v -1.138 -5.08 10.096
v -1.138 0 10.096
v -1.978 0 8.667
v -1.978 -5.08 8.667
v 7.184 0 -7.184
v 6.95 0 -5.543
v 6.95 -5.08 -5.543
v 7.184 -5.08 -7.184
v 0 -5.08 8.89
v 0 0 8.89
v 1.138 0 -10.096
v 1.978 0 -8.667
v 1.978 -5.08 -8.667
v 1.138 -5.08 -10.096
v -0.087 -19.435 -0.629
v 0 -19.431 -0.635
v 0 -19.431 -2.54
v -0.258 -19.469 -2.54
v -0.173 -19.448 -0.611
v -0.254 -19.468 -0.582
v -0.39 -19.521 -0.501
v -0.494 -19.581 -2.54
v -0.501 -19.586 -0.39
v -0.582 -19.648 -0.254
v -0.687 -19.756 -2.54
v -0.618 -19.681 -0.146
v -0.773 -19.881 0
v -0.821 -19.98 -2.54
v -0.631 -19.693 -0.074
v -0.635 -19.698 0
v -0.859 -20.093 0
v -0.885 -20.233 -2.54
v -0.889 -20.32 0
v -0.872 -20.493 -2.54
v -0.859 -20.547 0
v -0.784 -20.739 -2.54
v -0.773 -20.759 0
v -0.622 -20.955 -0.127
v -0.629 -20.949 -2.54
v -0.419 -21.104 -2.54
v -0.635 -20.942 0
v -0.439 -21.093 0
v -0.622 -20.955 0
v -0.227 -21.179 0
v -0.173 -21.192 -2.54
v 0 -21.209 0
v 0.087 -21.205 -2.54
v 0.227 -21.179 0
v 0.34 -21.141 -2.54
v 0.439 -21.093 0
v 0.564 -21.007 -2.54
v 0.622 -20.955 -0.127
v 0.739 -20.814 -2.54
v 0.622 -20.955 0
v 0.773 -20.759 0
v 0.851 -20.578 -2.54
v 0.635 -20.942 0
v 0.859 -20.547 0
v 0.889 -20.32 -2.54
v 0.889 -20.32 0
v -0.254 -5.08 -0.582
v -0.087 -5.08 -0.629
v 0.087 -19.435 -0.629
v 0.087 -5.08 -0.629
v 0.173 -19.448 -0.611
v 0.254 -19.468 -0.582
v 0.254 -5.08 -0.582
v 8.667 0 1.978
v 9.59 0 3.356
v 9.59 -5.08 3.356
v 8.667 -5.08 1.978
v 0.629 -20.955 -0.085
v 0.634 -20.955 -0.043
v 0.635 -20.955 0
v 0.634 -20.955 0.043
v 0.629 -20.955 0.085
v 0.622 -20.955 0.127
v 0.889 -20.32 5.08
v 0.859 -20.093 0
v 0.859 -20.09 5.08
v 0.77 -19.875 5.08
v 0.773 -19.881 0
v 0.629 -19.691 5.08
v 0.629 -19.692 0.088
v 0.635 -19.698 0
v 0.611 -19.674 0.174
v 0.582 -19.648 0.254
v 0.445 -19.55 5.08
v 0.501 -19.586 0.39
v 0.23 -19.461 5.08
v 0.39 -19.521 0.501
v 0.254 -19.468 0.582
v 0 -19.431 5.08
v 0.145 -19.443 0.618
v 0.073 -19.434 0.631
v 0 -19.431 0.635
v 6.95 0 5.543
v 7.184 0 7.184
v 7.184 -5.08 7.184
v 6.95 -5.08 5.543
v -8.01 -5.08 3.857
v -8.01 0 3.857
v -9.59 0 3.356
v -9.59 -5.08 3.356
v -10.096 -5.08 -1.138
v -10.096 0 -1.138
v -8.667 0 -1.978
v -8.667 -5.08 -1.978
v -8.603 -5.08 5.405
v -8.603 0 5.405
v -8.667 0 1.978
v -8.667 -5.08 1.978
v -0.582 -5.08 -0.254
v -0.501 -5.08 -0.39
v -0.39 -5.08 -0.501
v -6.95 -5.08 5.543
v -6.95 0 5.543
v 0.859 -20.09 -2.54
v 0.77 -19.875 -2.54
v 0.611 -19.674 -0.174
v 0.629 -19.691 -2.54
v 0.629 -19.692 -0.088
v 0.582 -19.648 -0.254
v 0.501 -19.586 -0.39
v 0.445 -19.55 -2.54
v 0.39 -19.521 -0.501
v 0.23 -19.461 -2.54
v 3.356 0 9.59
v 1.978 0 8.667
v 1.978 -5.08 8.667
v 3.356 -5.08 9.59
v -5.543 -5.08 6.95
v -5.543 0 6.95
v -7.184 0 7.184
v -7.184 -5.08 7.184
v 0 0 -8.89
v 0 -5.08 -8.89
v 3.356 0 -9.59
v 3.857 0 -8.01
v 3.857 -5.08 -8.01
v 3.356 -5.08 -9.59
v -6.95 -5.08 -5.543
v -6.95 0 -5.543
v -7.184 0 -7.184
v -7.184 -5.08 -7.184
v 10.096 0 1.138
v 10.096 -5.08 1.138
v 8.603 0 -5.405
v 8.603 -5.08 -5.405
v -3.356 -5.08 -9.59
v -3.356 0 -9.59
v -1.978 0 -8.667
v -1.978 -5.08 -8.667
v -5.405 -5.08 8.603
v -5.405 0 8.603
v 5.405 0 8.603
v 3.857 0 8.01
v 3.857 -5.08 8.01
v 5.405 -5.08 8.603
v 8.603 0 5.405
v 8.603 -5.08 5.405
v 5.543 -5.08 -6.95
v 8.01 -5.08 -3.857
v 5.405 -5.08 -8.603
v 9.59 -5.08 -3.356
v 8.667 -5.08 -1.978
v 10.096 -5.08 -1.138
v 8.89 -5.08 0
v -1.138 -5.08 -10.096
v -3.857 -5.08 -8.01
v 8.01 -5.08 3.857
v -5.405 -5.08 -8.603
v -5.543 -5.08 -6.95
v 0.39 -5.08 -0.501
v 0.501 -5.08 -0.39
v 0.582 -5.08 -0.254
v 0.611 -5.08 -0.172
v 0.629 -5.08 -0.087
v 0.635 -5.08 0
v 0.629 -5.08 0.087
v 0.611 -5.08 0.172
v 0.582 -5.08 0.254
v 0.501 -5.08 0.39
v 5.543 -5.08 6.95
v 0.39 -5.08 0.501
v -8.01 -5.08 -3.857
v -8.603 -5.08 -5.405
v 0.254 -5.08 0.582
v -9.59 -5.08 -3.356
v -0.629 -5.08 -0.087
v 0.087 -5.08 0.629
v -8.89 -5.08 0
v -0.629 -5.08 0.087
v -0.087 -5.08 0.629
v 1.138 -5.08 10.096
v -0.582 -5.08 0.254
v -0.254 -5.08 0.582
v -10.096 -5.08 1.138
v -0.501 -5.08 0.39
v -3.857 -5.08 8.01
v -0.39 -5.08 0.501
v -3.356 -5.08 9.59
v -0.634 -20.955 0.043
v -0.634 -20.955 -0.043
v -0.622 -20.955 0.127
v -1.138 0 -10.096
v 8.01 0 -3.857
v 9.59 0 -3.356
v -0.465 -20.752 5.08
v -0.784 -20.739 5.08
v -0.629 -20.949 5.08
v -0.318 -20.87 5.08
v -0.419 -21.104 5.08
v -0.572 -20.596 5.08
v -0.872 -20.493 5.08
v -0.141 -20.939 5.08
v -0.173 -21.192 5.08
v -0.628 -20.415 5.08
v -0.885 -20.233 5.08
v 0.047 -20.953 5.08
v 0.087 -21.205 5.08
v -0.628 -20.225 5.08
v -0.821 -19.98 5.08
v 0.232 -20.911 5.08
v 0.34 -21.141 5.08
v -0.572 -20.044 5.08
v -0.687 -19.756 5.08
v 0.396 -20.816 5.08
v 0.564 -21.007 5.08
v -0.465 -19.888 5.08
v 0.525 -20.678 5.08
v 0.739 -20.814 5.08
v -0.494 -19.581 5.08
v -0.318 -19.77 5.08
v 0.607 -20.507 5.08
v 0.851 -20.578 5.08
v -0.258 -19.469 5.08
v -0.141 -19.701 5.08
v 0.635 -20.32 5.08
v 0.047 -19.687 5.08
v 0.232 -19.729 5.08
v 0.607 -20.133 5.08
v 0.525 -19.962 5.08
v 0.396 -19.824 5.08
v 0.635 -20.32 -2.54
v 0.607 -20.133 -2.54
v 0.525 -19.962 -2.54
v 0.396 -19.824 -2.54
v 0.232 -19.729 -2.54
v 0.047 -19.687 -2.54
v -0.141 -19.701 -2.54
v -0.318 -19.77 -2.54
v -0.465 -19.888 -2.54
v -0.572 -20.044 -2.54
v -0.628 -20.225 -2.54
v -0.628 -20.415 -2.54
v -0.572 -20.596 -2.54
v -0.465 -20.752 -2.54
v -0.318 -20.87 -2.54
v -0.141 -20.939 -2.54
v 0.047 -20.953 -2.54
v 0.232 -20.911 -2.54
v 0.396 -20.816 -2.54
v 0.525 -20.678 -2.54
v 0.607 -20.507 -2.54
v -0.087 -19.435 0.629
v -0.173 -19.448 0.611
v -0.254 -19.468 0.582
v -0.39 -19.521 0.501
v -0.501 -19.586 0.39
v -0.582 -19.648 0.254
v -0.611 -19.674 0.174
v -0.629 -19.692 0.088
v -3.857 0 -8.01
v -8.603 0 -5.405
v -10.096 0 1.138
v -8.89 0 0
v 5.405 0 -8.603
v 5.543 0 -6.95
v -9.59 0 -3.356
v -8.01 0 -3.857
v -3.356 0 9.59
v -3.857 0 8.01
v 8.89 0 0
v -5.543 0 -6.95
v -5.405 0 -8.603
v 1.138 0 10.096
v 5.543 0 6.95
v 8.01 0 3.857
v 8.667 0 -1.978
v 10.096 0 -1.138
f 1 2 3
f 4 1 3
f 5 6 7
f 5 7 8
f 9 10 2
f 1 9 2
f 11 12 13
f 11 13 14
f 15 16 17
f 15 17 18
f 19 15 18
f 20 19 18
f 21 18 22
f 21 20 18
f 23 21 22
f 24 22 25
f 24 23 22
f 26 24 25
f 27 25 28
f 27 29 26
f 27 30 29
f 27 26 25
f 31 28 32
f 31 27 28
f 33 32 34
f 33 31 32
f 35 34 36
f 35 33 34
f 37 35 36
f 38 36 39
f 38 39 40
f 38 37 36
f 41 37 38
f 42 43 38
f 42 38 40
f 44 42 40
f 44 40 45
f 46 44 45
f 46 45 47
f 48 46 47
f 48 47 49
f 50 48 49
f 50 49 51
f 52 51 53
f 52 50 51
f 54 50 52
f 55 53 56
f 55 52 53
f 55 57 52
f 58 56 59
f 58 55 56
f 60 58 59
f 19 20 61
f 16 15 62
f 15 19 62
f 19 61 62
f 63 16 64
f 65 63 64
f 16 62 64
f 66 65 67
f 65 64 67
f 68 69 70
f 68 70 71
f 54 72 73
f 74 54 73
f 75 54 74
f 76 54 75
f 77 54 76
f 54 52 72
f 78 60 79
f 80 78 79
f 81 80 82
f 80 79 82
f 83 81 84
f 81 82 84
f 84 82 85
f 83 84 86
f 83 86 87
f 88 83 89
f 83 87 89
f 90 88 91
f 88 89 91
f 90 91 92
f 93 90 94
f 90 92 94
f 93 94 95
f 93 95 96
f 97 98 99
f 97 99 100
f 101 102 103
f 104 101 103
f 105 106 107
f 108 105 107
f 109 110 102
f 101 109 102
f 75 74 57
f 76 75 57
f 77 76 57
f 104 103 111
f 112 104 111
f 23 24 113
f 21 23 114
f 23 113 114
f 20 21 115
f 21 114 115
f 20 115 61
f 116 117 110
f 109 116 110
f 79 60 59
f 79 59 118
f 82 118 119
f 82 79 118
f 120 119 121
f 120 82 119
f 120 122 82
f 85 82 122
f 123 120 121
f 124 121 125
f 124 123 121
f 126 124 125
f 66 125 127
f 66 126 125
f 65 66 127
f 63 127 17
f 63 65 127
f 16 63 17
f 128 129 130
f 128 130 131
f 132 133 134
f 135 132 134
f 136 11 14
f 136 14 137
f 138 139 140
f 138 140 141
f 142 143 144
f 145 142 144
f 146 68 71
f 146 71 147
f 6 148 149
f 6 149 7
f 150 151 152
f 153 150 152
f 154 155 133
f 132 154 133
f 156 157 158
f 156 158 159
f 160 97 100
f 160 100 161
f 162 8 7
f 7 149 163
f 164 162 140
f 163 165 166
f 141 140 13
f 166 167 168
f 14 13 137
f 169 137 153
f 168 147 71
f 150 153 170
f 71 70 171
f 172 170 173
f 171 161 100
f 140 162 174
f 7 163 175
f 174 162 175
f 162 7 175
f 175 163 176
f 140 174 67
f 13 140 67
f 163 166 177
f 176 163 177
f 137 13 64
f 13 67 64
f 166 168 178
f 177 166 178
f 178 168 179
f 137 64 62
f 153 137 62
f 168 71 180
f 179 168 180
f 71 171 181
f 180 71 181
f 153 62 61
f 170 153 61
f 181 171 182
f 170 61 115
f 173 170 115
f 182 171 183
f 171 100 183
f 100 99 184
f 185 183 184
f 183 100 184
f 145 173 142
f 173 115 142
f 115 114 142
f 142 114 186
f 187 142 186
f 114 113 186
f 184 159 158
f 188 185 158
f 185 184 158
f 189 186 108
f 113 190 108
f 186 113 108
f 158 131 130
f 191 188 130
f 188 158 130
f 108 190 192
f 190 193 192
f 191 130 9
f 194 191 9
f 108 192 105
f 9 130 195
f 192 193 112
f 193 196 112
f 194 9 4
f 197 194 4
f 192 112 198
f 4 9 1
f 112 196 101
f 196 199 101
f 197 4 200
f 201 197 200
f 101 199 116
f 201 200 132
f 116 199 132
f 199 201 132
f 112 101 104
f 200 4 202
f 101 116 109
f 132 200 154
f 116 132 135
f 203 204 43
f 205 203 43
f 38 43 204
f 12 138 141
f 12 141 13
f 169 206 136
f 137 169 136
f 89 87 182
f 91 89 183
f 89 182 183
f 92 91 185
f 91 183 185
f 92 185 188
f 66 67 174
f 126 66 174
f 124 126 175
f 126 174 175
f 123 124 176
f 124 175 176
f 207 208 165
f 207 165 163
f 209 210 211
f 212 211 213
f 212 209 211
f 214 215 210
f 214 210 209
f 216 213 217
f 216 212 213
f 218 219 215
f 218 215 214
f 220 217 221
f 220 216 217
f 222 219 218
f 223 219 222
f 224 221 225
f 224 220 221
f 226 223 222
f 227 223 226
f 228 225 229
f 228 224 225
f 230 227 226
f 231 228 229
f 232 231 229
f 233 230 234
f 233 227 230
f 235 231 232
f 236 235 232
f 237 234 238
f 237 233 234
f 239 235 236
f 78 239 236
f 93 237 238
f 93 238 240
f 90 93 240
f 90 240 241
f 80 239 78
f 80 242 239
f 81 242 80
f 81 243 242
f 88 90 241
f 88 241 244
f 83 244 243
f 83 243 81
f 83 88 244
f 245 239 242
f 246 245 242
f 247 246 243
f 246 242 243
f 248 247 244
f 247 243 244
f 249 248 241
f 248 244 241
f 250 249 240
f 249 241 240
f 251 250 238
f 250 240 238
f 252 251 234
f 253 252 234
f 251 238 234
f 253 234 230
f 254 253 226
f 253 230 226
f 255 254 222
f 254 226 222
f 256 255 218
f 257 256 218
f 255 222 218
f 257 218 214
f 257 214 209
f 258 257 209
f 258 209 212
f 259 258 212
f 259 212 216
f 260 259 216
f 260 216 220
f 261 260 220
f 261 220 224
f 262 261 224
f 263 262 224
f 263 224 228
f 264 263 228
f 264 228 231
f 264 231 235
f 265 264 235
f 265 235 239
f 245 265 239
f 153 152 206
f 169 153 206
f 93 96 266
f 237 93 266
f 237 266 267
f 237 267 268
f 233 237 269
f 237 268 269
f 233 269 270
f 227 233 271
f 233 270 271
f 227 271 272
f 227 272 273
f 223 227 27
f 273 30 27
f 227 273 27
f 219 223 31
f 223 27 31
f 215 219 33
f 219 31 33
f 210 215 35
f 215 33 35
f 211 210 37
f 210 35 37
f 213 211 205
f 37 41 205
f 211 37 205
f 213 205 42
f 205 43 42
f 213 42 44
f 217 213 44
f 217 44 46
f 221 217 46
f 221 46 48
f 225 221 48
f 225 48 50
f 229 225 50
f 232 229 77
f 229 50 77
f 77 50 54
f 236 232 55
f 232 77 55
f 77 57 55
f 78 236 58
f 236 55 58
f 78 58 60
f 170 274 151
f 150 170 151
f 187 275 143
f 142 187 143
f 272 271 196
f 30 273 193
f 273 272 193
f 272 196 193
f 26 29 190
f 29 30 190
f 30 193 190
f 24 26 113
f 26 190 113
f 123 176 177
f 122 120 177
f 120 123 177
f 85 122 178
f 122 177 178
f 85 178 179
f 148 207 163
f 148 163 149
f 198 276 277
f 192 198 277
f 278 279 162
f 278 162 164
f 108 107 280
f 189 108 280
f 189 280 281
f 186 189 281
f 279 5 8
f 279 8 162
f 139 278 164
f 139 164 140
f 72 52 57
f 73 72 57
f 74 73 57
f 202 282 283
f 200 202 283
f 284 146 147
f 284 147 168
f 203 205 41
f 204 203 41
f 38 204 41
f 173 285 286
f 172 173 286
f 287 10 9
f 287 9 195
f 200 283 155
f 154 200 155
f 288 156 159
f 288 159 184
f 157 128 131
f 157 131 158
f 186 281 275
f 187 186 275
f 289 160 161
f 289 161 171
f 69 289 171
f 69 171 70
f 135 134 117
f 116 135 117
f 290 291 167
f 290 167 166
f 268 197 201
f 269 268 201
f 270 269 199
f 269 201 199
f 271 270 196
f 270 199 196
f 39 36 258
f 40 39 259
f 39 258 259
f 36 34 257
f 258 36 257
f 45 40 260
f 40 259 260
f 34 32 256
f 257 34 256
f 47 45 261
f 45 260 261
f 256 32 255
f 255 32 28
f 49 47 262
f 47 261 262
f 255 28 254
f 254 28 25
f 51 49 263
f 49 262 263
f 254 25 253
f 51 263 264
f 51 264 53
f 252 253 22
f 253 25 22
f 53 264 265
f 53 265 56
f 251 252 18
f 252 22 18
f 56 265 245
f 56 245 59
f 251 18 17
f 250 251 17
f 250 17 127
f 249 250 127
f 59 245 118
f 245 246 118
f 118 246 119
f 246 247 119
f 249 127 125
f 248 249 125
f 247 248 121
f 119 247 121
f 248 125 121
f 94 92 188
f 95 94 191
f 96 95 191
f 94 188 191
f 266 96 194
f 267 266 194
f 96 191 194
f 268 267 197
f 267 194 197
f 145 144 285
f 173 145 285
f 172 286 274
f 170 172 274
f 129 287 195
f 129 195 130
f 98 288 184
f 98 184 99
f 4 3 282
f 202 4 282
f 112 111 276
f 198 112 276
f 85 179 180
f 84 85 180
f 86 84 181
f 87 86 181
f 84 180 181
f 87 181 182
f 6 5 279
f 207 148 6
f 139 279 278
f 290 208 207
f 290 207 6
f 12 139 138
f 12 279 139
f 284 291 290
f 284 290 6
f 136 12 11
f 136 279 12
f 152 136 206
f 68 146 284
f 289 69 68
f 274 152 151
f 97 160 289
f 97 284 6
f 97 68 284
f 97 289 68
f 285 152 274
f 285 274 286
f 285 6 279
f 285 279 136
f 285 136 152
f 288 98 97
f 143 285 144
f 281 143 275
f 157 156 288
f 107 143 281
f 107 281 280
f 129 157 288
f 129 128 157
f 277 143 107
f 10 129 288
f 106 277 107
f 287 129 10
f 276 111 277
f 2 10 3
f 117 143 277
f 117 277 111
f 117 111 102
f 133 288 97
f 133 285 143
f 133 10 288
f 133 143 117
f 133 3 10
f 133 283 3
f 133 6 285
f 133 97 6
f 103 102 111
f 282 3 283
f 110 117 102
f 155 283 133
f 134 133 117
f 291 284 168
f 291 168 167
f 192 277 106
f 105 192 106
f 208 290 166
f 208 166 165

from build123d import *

# Parameters (mm, degrees)
F1_DEPTH      = 5.08
F3_W          = 0.508
F3_H          = 0.508
F4_DEPTH      = 15.875
F6_DEPTH      = 5.08
F6_DEPTH_BACK = 2.54
F7_R          = 0.635
F8_DEPTH      = 15.1771160525


with BuildPart() as f1:
    # F0 (on Front) → F1 (new body)
    with BuildSketch(Plane.XZ):
        with BuildLine():
            Line((-4.7297651602, 7.5273781311), (0, 0))
            Line((0, 0), (-3.8572264408, 8.0096132357))
            ThreePointArc((-3.8572264408, 8.0096132357), (-4.3002609064, 7.7807362208), (-4.7297651602, 7.5273781311))
        make_face()
        with BuildLine():
            Line((-5.5428243385, 6.9504818791), (0, 0))
            Line((0, 0), (-4.7297651602, 7.5273781311))
            ThreePointArc((-4.7297651602, 7.5273781311), (-5.144387823, 7.250336125), (-5.5428243385, 6.9504818791))
        make_face()
        with BuildLine():
            Line((-5.4054458974, 8.6027178642), (-5.5428243385, 6.9504818791))
            ThreePointArc((-5.5428243385, 6.9504818791), (-5.144387823, 7.250336125), (-4.7297651602, 7.5273781311))
            Line((-4.7297651602, 7.5273781311), (-5.4054458974, 8.6027178642))
        make_face()
        with BuildLine():
            Line((-5.4054458974, 8.6027178642), (-4.7297651602, 7.5273781311))
            ThreePointArc((-4.7297651602, 7.5273781311), (-4.3002609064, 7.7807362208), (-3.8572264408, 8.0096132357))
            Line((-3.8572264408, 8.0096132357), (-5.4054458974, 8.6027178642))
        make_face()
        with BuildLine():
            Line((-3.3556352695, 9.5898546359), (-3.8572264408, 8.0096132357))
            ThreePointArc((-3.8572264408, 8.0096132357), (-3.4020557137, 8.213289044), (-2.9361808608, 8.3911228064))
            Line((-2.9361808608, 8.3911228064), (-3.3556352695, 9.5898546359))
        make_face()
        with BuildLine():
            Line((-3.3556352695, 9.5898546359), (-2.9361808608, 8.3911228064))
            ThreePointArc((-2.9361808608, 8.3911228064), (-2.4610676966, 8.5425549921), (-1.9782111029, 8.6671091393))
            Line((-1.9782111029, 8.6671091393), (-3.3556352695, 9.5898546359))
        make_face()
        with BuildLine():
            Line((-2.9361808608, 8.3911228064), (0, 0))
            Line((0, 0), (-1.9782111029, 8.6671091393))
            ThreePointArc((-1.9782111029, 8.6671091393), (-2.4610676966, 8.5425549921), (-2.9361808608, 8.3911228064))
        make_face()
        with BuildLine():
            Line((-3.8572264408, 8.0096132357), (0, 0))
            Line((0, 0), (-2.9361808608, 8.3911228064))
            ThreePointArc((-2.9361808608, 8.3911228064), (-3.4020557137, 8.213289044), (-3.8572264408, 8.0096132357))
        make_face()
        with BuildLine():
            Line((-0.9953641926, 8.834101546), (0, 0))
            Line((0, 0), (0, 8.89))
            ThreePointArc((0, 8.89), (-0.4984662759, 8.8760143855), (-0.9953641926, 8.834101546))
        make_face()
        with BuildLine():
            ThreePointArc((-0.9953641926, 8.834101546), (-0.4984662759, 8.8760143855), (0, 8.89))
            Line((0, 8.89), (-1.1375590772, 10.0961160525))
            Line((-1.1375590772, 10.0961160525), (-0.9953641926, 8.834101546))
        make_face()
        with BuildLine():
            Line((-1.1375590772, 10.0961160525), (-1.9782111029, 8.6671091393))
            ThreePointArc((-1.9782111029, 8.6671091393), (-1.4891303252, 8.7643933546), (-0.9953641926, 8.834101546))
            Line((-0.9953641926, 8.834101546), (-1.1375590772, 10.0961160525))
        make_face()
        with BuildLine():
            Line((-1.9782111029, 8.6671091393), (0, 0))
            Line((0, 0), (-0.9953641926, 8.834101546))
            ThreePointArc((-0.9953641926, 8.834101546), (-1.4891303252, 8.7643933546), (-1.9782111029, 8.6671091393))
        make_face()
        with BuildLine():
            Line((-6.2861792847, 6.2861792847), (0, 0))
            Line((0, 0), (-5.5428243385, 6.9504818791))
            ThreePointArc((-5.5428243385, 6.9504818791), (-5.923821078, 6.6287588458), (-6.2861792847, 6.2861792847))
        make_face()
        with BuildLine():
            Line((-7.1842048969, 7.1842048969), (-6.2861792847, 6.2861792847))
            ThreePointArc((-6.2861792847, 6.2861792847), (-5.923821078, 6.6287588458), (-5.5428243385, 6.9504818791))
            Line((-5.5428243385, 6.9504818791), (-7.1842048969, 7.1842048969))
        make_face()
        with BuildLine():
            Line((-6.9504818791, 5.5428243385), (0, 0))
            Line((0, 0), (-6.2861792847, 6.2861792847))
            ThreePointArc((-6.2861792847, 6.2861792847), (-6.6287588458, 5.923821078), (-6.9504818791, 5.5428243385))
        make_face()
        with BuildLine():
            Line((-7.1842048969, 7.1842048969), (-6.9504818791, 5.5428243385))
            ThreePointArc((-6.9504818791, 5.5428243385), (-6.6287588458, 5.923821078), (-6.2861792847, 6.2861792847))
            Line((-6.2861792847, 6.2861792847), (-7.1842048969, 7.1842048969))
        make_face()
        with BuildLine():
            Line((-7.5273781311, 4.7297651602), (0, 0))
            Line((0, 0), (-6.9504818791, 5.5428243385))
            ThreePointArc((-6.9504818791, 5.5428243385), (-7.250336125, 5.144387823), (-7.5273781311, 4.7297651602))
        make_face()
        with BuildLine():
            Line((-8.6027178642, 5.4054458974), (-7.5273781311, 4.7297651602))
            ThreePointArc((-7.5273781311, 4.7297651602), (-7.250336125, 5.144387823), (-6.9504818791, 5.5428243385))
            Line((-6.9504818791, 5.5428243385), (-8.6027178642, 5.4054458974))
        make_face()
        with BuildLine():
            Line((-8.6027178642, 5.4054458974), (-8.0096132357, 3.8572264408))
            ThreePointArc((-8.0096132357, 3.8572264408), (-7.7807362208, 4.3002609064), (-7.5273781311, 4.7297651602))
            Line((-7.5273781311, 4.7297651602), (-8.6027178642, 5.4054458974))
        make_face()
        with BuildLine():
            Line((-8.0096132357, 3.8572264408), (0, 0))
            Line((0, 0), (-7.5273781311, 4.7297651602))
            ThreePointArc((-7.5273781311, 4.7297651602), (-7.7807362208, 4.3002609064), (-8.0096132357, 3.8572264408))
        make_face()
        with BuildLine():
            Line((-8.3911228064, 2.9361808608), (0, 0))
            Line((0, 0), (-8.0096132357, 3.8572264408))
            ThreePointArc((-8.0096132357, 3.8572264408), (-8.213289044, 3.4020557137), (-8.3911228064, 2.9361808608))
        make_face()
        with BuildLine():
            Line((-9.5898546359, 3.3556352695), (-8.3911228064, 2.9361808608))
            ThreePointArc((-8.3911228064, 2.9361808608), (-8.213289044, 3.4020557137), (-8.0096132357, 3.8572264408))
            Line((-8.0096132357, 3.8572264408), (-9.5898546359, 3.3556352695))
        make_face()
        with BuildLine():
            Line((-9.5898546359, 3.3556352695), (-8.6671091393, 1.9782111029))
            ThreePointArc((-8.6671091393, 1.9782111029), (-8.5425549921, 2.4610676966), (-8.3911228064, 2.9361808608))
            Line((-8.3911228064, 2.9361808608), (-9.5898546359, 3.3556352695))
        make_face()
        with BuildLine():
            Line((-8.6671091393, 1.9782111029), (0, 0))
            Line((0, 0), (-8.3911228064, 2.9361808608))
            ThreePointArc((-8.3911228064, 2.9361808608), (-8.5425549921, 2.4610676966), (-8.6671091393, 1.9782111029))
        make_face()
        with BuildLine():
            Line((-8.834101546, 0.9953641926), (0, 0))
            Line((0, 0), (-8.6671091393, 1.9782111029))
            ThreePointArc((-8.6671091393, 1.9782111029), (-8.7643933546, 1.4891303252), (-8.834101546, 0.9953641926))
        make_face()
        with BuildLine():
            Line((-10.0961160525, 1.1375590772), (-8.834101546, 0.9953641926))
            ThreePointArc((-8.834101546, 0.9953641926), (-8.7643933546, 1.4891303252), (-8.6671091393, 1.9782111029))
            Line((-8.6671091393, 1.9782111029), (-10.0961160525, 1.1375590772))
        make_face()
        with BuildLine():
            Line((-10.0961160525, 1.1375590772), (-8.89, 0))
            ThreePointArc((-8.89, 0), (-8.8760143855, 0.4984662759), (-8.834101546, 0.9953641926))
            Line((-8.834101546, 0.9953641926), (-10.0961160525, 1.1375590772))
        make_face()
        with BuildLine():
            Line((-8.89, 0), (0, 0))
            Line((0, 0), (-8.834101546, 0.9953641926))
            ThreePointArc((-8.834101546, 0.9953641926), (-8.8760143855, 0.4984662759), (-8.89, 0))
        make_face()
        with BuildLine():
            Line((-8.834101546, -0.9953641926), (0, 0))
            Line((0, 0), (-8.89, 0))
            ThreePointArc((-8.89, 0), (-8.8760143855, -0.4984662759), (-8.834101546, -0.9953641926))
        make_face()
        with BuildLine():
            Line((-10.0961160525, -1.1375590772), (-8.834101546, -0.9953641926))
            ThreePointArc((-8.834101546, -0.9953641926), (-8.8760143855, -0.4984662759), (-8.89, 0))
            Line((-8.89, 0), (-10.0961160525, -1.1375590772))
        make_face()
        with BuildLine():
            Line((-10.0961160525, -1.1375590772), (-8.6671091393, -1.9782111029))
            ThreePointArc((-8.6671091393, -1.9782111029), (-8.7643933546, -1.4891303252), (-8.834101546, -0.9953641926))
            Line((-8.834101546, -0.9953641926), (-10.0961160525, -1.1375590772))
        make_face()
        with BuildLine():
            Line((-8.6671091393, -1.9782111029), (0, 0))
            Line((0, 0), (-8.834101546, -0.9953641926))
            ThreePointArc((-8.834101546, -0.9953641926), (-8.7643933546, -1.4891303252), (-8.6671091393, -1.9782111029))
        make_face()
        with BuildLine():
            Line((-8.3911228064, -2.9361808608), (0, 0))
            Line((0, 0), (-8.6671091393, -1.9782111029))
            ThreePointArc((-8.6671091393, -1.9782111029), (-8.5425549921, -2.4610676966), (-8.3911228064, -2.9361808608))
        make_face()
        with BuildLine():
            Line((-9.5898546359, -3.3556352695), (-8.3911228064, -2.9361808608))
            ThreePointArc((-8.3911228064, -2.9361808608), (-8.5425549921, -2.4610676966), (-8.6671091393, -1.9782111029))
            Line((-8.6671091393, -1.9782111029), (-9.5898546359, -3.3556352695))
        make_face()
        with BuildLine():
            Line((-9.5898546359, -3.3556352695), (-8.0096132357, -3.8572264408))
            ThreePointArc((-8.0096132357, -3.8572264408), (-8.213289044, -3.4020557137), (-8.3911228064, -2.9361808608))
            Line((-8.3911228064, -2.9361808608), (-9.5898546359, -3.3556352695))
        make_face()
        with BuildLine():
            Line((-8.0096132357, -3.8572264408), (0, 0))
            Line((0, 0), (-8.3911228064, -2.9361808608))
            ThreePointArc((-8.3911228064, -2.9361808608), (-8.213289044, -3.4020557137), (-8.0096132357, -3.8572264408))
        make_face()
        with BuildLine():
            Line((-7.5273781311, -4.7297651602), (0, 0))
            Line((0, 0), (-8.0096132357, -3.8572264408))
            ThreePointArc((-8.0096132357, -3.8572264408), (-7.7807362208, -4.3002609064), (-7.5273781311, -4.7297651602))
        make_face()
        with BuildLine():
            Line((-8.6027178642, -5.4054458974), (-7.5273781311, -4.7297651602))
            ThreePointArc((-7.5273781311, -4.7297651602), (-7.7807362208, -4.3002609064), (-8.0096132357, -3.8572264408))
            Line((-8.0096132357, -3.8572264408), (-8.6027178642, -5.4054458974))
        make_face()
        with BuildLine():
            Line((-8.6027178642, -5.4054458974), (-6.9504818791, -5.5428243385))
            ThreePointArc((-6.9504818791, -5.5428243385), (-7.250336125, -5.144387823), (-7.5273781311, -4.7297651602))
            Line((-7.5273781311, -4.7297651602), (-8.6027178642, -5.4054458974))
        make_face()
        with BuildLine():
            Line((-6.9504818791, -5.5428243385), (0, 0))
            Line((0, 0), (-7.5273781311, -4.7297651602))
            ThreePointArc((-7.5273781311, -4.7297651602), (-7.250336125, -5.144387823), (-6.9504818791, -5.5428243385))
        make_face()
        with BuildLine():
            Line((-6.2861792847, -6.2861792847), (0, 0))
            Line((0, 0), (-6.9504818791, -5.5428243385))
            ThreePointArc((-6.9504818791, -5.5428243385), (-6.6287588458, -5.923821078), (-6.2861792847, -6.2861792847))
        make_face()
        with BuildLine():
            Line((-5.5428243385, -6.9504818791), (0, 0))
            Line((0, 0), (-6.2861792847, -6.2861792847))
            ThreePointArc((-6.2861792847, -6.2861792847), (-5.923821078, -6.6287588458), (-5.5428243385, -6.9504818791))
        make_face()
        with BuildLine():
            Line((-4.7297651602, -7.5273781311), (0, 0))
            Line((0, 0), (-5.5428243385, -6.9504818791))
            ThreePointArc((-5.5428243385, -6.9504818791), (-5.144387823, -7.250336125), (-4.7297651602, -7.5273781311))
        make_face()
        with BuildLine():
            Line((-7.1842048969, -7.1842048969), (-6.2861792847, -6.2861792847))
            ThreePointArc((-6.2861792847, -6.2861792847), (-6.6287588458, -5.923821078), (-6.9504818791, -5.5428243385))
            Line((-6.9504818791, -5.5428243385), (-7.1842048969, -7.1842048969))
        make_face()
        with BuildLine():
            Line((-7.1842048969, -7.1842048969), (-5.5428243385, -6.9504818791))
            ThreePointArc((-5.5428243385, -6.9504818791), (-5.923821078, -6.6287588458), (-6.2861792847, -6.2861792847))
            Line((-6.2861792847, -6.2861792847), (-7.1842048969, -7.1842048969))
        make_face()
        with BuildLine():
            Line((-5.4054458974, -8.6027178642), (-4.7297651602, -7.5273781311))
            ThreePointArc((-4.7297651602, -7.5273781311), (-5.144387823, -7.250336125), (-5.5428243385, -6.9504818791))
            Line((-5.5428243385, -6.9504818791), (-5.4054458974, -8.6027178642))
        make_face()
        with BuildLine():
            Line((-5.4054458974, -8.6027178642), (-3.8572264408, -8.0096132357))
            ThreePointArc((-3.8572264408, -8.0096132357), (-4.3002609064, -7.7807362208), (-4.7297651602, -7.5273781311))
            Line((-4.7297651602, -7.5273781311), (-5.4054458974, -8.6027178642))
        make_face()
        with BuildLine():
            Line((-2.9361808608, -8.3911228064), (0, 0))
            Line((0, 0), (-3.8572264408, -8.0096132357))
            ThreePointArc((-3.8572264408, -8.0096132357), (-3.4020557137, -8.213289044), (-2.9361808608, -8.3911228064))
        make_face()
        with BuildLine():
            Line((-3.3556352695, -9.5898546359), (-2.9361808608, -8.3911228064))
            ThreePointArc((-2.9361808608, -8.3911228064), (-3.4020557137, -8.213289044), (-3.8572264408, -8.0096132357))
            Line((-3.8572264408, -8.0096132357), (-3.3556352695, -9.5898546359))
        make_face()
        with BuildLine():
            Line((-3.3556352695, -9.5898546359), (-1.9782111029, -8.6671091393))
            ThreePointArc((-1.9782111029, -8.6671091393), (-2.4610676966, -8.5425549921), (-2.9361808608, -8.3911228064))
            Line((-2.9361808608, -8.3911228064), (-3.3556352695, -9.5898546359))
        make_face()
        with BuildLine():
            Line((-1.9782111029, -8.6671091393), (0, 0))
            Line((0, 0), (-2.9361808608, -8.3911228064))
            ThreePointArc((-2.9361808608, -8.3911228064), (-2.4610676966, -8.5425549921), (-1.9782111029, -8.6671091393))
        make_face()
        with BuildLine():
            Line((-0.9953641926, -8.834101546), (0, 0))
            Line((0, 0), (-1.9782111029, -8.6671091393))
            ThreePointArc((-1.9782111029, -8.6671091393), (-1.4891303252, -8.7643933546), (-0.9953641926, -8.834101546))
        make_face()
        with BuildLine():
            Line((-1.1375590772, -10.0961160525), (0, -8.89))
            ThreePointArc((0, -8.89), (-0.4984662759, -8.8760143855), (-0.9953641926, -8.834101546))
            Line((-0.9953641926, -8.834101546), (-1.1375590772, -10.0961160525))
        make_face()
        with BuildLine():
            ThreePointArc((-0.9953641926, -8.834101546), (-1.4891303252, -8.7643933546), (-1.9782111029, -8.6671091393))
            Line((-1.9782111029, -8.6671091393), (-1.1375590772, -10.0961160525))
            Line((-1.1375590772, -10.0961160525), (-0.9953641926, -8.834101546))
        make_face()
        with BuildLine():
            Line((0, -8.89), (0, 0))
            Line((0, 0), (-0.9953641926, -8.834101546))
            ThreePointArc((-0.9953641926, -8.834101546), (-0.4984662759, -8.8760143855), (0, -8.89))
        make_face()
        with BuildLine():
            Line((-3.8572264408, -8.0096132357), (0, 0))
            Line((0, 0), (-4.7297651602, -7.5273781311))
            ThreePointArc((-4.7297651602, -7.5273781311), (-4.3002609064, -7.7807362208), (-3.8572264408, -8.0096132357))
        make_face()
    extrude(amount=F1_DEPTH)

    # F2: F1 across plane


with BuildPart() as f1_1:
    add(f1.part)
    add(f1.part.mirror(Plane.YZ))

    # F3 (on face) → F4 (join)
    with BuildSketch(Plane.XZ.offset(5.08)):
        with BuildLine():
            Line((0.254, 0.254), (0.254, 0.5819871133))
            ThreePointArc((0.254, 0.5819871133), (0, 0.635), (-0.254, 0.5819871133))
            Line((-0.254, 0.5819871133), (-0.254, 0.254))
            Line((-0.254, 0.254), (0.254, 0.254))
        make_face()
        with BuildLine():
            Line((-0.254, -0.254), (-0.254, 0.254))
            Line((-0.254, 0.254), (-0.5819871133, 0.254))
            ThreePointArc((-0.5819871133, 0.254), (-0.635, 0), (-0.5819871133, -0.254))
            Line((-0.5819871133, -0.254), (-0.254, -0.254))
        make_face()
        Rectangle(F3_W, F3_H)
        with BuildLine():
            ThreePointArc((0.5819871133, -0.254), (0.6216055087, -0.1297366237), (0.635, 0))
            ThreePointArc((0.635, 0), (0.6216055087, 0.1297366237), (0.5819871133, 0.254))
            Line((0.5819871133, 0.254), (0.254, 0.254))
            Line((0.254, 0.254), (0.254, -0.254))
            Line((0.254, -0.254), (0.5819871133, -0.254))
        make_face()
        with BuildLine():
            ThreePointArc((-0.254, -0.5819871133), (0, -0.635), (0.254, -0.5819871133))
            Line((0.254, -0.5819871133), (0.254, -0.254))
            Line((0.254, -0.254), (-0.254, -0.254))
            Line((-0.254, -0.254), (-0.254, -0.5819871133))
        make_face()
        with BuildLine():
            Line((-0.254, 0.254), (-0.254, 0.5819871133))
            ThreePointArc((-0.254, 0.5819871133), (-0.4490128061, 0.4490128061), (-0.5819871133, 0.254))
            Line((-0.5819871133, 0.254), (-0.254, 0.254))
        make_face()
        with BuildLine():
            Line((0.254, 0.254), (0.5819871133, 0.254))
            ThreePointArc((0.5819871133, 0.254), (0.4490128061, 0.4490128061), (0.254, 0.5819871133))
            Line((0.254, 0.5819871133), (0.254, 0.254))
        make_face()
        with BuildLine():
            ThreePointArc((0.254, -0.5819871133), (0.4490128061, -0.4490128061), (0.5819871133, -0.254))
            Line((0.5819871133, -0.254), (0.254, -0.254))
            Line((0.254, -0.254), (0.254, -0.5819871133))
        make_face()
        with BuildLine():
            ThreePointArc((-0.5819871133, -0.254), (-0.4490128061, -0.4490128061), (-0.254, -0.5819871133))
            Line((-0.254, -0.5819871133), (-0.254, -0.254))
            Line((-0.254, -0.254), (-0.5819871133, -0.254))
        make_face()
    extrude(amount=F4_DEPTH)

    # F5 (on Top) → F6 (join, two sides)
    with BuildSketch(Plane.XY) as f6_sk:
        with BuildLine():
            ThreePointArc((0, -19.431), (-0.6286179285, -20.9486179285), (0.889, -20.32))
            ThreePointArc((0.889, -20.32), (0.6286179285, -19.6913820715), (0, -19.431))
        make_face()
    extrude(amount=F6_DEPTH)
    extrude(f6_sk.sketch, amount=-F6_DEPTH_BACK)

    # F7 (on face) → F8 (cut, through all)
    with BuildSketch(Plane.XY.offset(5.08)):
        with Locations((0, -20.32)):
            Circle(F7_R)
    extrude(amount=-F8_DEPTH, mode=Mode.SUBTRACT)


solid = f1_1.part
